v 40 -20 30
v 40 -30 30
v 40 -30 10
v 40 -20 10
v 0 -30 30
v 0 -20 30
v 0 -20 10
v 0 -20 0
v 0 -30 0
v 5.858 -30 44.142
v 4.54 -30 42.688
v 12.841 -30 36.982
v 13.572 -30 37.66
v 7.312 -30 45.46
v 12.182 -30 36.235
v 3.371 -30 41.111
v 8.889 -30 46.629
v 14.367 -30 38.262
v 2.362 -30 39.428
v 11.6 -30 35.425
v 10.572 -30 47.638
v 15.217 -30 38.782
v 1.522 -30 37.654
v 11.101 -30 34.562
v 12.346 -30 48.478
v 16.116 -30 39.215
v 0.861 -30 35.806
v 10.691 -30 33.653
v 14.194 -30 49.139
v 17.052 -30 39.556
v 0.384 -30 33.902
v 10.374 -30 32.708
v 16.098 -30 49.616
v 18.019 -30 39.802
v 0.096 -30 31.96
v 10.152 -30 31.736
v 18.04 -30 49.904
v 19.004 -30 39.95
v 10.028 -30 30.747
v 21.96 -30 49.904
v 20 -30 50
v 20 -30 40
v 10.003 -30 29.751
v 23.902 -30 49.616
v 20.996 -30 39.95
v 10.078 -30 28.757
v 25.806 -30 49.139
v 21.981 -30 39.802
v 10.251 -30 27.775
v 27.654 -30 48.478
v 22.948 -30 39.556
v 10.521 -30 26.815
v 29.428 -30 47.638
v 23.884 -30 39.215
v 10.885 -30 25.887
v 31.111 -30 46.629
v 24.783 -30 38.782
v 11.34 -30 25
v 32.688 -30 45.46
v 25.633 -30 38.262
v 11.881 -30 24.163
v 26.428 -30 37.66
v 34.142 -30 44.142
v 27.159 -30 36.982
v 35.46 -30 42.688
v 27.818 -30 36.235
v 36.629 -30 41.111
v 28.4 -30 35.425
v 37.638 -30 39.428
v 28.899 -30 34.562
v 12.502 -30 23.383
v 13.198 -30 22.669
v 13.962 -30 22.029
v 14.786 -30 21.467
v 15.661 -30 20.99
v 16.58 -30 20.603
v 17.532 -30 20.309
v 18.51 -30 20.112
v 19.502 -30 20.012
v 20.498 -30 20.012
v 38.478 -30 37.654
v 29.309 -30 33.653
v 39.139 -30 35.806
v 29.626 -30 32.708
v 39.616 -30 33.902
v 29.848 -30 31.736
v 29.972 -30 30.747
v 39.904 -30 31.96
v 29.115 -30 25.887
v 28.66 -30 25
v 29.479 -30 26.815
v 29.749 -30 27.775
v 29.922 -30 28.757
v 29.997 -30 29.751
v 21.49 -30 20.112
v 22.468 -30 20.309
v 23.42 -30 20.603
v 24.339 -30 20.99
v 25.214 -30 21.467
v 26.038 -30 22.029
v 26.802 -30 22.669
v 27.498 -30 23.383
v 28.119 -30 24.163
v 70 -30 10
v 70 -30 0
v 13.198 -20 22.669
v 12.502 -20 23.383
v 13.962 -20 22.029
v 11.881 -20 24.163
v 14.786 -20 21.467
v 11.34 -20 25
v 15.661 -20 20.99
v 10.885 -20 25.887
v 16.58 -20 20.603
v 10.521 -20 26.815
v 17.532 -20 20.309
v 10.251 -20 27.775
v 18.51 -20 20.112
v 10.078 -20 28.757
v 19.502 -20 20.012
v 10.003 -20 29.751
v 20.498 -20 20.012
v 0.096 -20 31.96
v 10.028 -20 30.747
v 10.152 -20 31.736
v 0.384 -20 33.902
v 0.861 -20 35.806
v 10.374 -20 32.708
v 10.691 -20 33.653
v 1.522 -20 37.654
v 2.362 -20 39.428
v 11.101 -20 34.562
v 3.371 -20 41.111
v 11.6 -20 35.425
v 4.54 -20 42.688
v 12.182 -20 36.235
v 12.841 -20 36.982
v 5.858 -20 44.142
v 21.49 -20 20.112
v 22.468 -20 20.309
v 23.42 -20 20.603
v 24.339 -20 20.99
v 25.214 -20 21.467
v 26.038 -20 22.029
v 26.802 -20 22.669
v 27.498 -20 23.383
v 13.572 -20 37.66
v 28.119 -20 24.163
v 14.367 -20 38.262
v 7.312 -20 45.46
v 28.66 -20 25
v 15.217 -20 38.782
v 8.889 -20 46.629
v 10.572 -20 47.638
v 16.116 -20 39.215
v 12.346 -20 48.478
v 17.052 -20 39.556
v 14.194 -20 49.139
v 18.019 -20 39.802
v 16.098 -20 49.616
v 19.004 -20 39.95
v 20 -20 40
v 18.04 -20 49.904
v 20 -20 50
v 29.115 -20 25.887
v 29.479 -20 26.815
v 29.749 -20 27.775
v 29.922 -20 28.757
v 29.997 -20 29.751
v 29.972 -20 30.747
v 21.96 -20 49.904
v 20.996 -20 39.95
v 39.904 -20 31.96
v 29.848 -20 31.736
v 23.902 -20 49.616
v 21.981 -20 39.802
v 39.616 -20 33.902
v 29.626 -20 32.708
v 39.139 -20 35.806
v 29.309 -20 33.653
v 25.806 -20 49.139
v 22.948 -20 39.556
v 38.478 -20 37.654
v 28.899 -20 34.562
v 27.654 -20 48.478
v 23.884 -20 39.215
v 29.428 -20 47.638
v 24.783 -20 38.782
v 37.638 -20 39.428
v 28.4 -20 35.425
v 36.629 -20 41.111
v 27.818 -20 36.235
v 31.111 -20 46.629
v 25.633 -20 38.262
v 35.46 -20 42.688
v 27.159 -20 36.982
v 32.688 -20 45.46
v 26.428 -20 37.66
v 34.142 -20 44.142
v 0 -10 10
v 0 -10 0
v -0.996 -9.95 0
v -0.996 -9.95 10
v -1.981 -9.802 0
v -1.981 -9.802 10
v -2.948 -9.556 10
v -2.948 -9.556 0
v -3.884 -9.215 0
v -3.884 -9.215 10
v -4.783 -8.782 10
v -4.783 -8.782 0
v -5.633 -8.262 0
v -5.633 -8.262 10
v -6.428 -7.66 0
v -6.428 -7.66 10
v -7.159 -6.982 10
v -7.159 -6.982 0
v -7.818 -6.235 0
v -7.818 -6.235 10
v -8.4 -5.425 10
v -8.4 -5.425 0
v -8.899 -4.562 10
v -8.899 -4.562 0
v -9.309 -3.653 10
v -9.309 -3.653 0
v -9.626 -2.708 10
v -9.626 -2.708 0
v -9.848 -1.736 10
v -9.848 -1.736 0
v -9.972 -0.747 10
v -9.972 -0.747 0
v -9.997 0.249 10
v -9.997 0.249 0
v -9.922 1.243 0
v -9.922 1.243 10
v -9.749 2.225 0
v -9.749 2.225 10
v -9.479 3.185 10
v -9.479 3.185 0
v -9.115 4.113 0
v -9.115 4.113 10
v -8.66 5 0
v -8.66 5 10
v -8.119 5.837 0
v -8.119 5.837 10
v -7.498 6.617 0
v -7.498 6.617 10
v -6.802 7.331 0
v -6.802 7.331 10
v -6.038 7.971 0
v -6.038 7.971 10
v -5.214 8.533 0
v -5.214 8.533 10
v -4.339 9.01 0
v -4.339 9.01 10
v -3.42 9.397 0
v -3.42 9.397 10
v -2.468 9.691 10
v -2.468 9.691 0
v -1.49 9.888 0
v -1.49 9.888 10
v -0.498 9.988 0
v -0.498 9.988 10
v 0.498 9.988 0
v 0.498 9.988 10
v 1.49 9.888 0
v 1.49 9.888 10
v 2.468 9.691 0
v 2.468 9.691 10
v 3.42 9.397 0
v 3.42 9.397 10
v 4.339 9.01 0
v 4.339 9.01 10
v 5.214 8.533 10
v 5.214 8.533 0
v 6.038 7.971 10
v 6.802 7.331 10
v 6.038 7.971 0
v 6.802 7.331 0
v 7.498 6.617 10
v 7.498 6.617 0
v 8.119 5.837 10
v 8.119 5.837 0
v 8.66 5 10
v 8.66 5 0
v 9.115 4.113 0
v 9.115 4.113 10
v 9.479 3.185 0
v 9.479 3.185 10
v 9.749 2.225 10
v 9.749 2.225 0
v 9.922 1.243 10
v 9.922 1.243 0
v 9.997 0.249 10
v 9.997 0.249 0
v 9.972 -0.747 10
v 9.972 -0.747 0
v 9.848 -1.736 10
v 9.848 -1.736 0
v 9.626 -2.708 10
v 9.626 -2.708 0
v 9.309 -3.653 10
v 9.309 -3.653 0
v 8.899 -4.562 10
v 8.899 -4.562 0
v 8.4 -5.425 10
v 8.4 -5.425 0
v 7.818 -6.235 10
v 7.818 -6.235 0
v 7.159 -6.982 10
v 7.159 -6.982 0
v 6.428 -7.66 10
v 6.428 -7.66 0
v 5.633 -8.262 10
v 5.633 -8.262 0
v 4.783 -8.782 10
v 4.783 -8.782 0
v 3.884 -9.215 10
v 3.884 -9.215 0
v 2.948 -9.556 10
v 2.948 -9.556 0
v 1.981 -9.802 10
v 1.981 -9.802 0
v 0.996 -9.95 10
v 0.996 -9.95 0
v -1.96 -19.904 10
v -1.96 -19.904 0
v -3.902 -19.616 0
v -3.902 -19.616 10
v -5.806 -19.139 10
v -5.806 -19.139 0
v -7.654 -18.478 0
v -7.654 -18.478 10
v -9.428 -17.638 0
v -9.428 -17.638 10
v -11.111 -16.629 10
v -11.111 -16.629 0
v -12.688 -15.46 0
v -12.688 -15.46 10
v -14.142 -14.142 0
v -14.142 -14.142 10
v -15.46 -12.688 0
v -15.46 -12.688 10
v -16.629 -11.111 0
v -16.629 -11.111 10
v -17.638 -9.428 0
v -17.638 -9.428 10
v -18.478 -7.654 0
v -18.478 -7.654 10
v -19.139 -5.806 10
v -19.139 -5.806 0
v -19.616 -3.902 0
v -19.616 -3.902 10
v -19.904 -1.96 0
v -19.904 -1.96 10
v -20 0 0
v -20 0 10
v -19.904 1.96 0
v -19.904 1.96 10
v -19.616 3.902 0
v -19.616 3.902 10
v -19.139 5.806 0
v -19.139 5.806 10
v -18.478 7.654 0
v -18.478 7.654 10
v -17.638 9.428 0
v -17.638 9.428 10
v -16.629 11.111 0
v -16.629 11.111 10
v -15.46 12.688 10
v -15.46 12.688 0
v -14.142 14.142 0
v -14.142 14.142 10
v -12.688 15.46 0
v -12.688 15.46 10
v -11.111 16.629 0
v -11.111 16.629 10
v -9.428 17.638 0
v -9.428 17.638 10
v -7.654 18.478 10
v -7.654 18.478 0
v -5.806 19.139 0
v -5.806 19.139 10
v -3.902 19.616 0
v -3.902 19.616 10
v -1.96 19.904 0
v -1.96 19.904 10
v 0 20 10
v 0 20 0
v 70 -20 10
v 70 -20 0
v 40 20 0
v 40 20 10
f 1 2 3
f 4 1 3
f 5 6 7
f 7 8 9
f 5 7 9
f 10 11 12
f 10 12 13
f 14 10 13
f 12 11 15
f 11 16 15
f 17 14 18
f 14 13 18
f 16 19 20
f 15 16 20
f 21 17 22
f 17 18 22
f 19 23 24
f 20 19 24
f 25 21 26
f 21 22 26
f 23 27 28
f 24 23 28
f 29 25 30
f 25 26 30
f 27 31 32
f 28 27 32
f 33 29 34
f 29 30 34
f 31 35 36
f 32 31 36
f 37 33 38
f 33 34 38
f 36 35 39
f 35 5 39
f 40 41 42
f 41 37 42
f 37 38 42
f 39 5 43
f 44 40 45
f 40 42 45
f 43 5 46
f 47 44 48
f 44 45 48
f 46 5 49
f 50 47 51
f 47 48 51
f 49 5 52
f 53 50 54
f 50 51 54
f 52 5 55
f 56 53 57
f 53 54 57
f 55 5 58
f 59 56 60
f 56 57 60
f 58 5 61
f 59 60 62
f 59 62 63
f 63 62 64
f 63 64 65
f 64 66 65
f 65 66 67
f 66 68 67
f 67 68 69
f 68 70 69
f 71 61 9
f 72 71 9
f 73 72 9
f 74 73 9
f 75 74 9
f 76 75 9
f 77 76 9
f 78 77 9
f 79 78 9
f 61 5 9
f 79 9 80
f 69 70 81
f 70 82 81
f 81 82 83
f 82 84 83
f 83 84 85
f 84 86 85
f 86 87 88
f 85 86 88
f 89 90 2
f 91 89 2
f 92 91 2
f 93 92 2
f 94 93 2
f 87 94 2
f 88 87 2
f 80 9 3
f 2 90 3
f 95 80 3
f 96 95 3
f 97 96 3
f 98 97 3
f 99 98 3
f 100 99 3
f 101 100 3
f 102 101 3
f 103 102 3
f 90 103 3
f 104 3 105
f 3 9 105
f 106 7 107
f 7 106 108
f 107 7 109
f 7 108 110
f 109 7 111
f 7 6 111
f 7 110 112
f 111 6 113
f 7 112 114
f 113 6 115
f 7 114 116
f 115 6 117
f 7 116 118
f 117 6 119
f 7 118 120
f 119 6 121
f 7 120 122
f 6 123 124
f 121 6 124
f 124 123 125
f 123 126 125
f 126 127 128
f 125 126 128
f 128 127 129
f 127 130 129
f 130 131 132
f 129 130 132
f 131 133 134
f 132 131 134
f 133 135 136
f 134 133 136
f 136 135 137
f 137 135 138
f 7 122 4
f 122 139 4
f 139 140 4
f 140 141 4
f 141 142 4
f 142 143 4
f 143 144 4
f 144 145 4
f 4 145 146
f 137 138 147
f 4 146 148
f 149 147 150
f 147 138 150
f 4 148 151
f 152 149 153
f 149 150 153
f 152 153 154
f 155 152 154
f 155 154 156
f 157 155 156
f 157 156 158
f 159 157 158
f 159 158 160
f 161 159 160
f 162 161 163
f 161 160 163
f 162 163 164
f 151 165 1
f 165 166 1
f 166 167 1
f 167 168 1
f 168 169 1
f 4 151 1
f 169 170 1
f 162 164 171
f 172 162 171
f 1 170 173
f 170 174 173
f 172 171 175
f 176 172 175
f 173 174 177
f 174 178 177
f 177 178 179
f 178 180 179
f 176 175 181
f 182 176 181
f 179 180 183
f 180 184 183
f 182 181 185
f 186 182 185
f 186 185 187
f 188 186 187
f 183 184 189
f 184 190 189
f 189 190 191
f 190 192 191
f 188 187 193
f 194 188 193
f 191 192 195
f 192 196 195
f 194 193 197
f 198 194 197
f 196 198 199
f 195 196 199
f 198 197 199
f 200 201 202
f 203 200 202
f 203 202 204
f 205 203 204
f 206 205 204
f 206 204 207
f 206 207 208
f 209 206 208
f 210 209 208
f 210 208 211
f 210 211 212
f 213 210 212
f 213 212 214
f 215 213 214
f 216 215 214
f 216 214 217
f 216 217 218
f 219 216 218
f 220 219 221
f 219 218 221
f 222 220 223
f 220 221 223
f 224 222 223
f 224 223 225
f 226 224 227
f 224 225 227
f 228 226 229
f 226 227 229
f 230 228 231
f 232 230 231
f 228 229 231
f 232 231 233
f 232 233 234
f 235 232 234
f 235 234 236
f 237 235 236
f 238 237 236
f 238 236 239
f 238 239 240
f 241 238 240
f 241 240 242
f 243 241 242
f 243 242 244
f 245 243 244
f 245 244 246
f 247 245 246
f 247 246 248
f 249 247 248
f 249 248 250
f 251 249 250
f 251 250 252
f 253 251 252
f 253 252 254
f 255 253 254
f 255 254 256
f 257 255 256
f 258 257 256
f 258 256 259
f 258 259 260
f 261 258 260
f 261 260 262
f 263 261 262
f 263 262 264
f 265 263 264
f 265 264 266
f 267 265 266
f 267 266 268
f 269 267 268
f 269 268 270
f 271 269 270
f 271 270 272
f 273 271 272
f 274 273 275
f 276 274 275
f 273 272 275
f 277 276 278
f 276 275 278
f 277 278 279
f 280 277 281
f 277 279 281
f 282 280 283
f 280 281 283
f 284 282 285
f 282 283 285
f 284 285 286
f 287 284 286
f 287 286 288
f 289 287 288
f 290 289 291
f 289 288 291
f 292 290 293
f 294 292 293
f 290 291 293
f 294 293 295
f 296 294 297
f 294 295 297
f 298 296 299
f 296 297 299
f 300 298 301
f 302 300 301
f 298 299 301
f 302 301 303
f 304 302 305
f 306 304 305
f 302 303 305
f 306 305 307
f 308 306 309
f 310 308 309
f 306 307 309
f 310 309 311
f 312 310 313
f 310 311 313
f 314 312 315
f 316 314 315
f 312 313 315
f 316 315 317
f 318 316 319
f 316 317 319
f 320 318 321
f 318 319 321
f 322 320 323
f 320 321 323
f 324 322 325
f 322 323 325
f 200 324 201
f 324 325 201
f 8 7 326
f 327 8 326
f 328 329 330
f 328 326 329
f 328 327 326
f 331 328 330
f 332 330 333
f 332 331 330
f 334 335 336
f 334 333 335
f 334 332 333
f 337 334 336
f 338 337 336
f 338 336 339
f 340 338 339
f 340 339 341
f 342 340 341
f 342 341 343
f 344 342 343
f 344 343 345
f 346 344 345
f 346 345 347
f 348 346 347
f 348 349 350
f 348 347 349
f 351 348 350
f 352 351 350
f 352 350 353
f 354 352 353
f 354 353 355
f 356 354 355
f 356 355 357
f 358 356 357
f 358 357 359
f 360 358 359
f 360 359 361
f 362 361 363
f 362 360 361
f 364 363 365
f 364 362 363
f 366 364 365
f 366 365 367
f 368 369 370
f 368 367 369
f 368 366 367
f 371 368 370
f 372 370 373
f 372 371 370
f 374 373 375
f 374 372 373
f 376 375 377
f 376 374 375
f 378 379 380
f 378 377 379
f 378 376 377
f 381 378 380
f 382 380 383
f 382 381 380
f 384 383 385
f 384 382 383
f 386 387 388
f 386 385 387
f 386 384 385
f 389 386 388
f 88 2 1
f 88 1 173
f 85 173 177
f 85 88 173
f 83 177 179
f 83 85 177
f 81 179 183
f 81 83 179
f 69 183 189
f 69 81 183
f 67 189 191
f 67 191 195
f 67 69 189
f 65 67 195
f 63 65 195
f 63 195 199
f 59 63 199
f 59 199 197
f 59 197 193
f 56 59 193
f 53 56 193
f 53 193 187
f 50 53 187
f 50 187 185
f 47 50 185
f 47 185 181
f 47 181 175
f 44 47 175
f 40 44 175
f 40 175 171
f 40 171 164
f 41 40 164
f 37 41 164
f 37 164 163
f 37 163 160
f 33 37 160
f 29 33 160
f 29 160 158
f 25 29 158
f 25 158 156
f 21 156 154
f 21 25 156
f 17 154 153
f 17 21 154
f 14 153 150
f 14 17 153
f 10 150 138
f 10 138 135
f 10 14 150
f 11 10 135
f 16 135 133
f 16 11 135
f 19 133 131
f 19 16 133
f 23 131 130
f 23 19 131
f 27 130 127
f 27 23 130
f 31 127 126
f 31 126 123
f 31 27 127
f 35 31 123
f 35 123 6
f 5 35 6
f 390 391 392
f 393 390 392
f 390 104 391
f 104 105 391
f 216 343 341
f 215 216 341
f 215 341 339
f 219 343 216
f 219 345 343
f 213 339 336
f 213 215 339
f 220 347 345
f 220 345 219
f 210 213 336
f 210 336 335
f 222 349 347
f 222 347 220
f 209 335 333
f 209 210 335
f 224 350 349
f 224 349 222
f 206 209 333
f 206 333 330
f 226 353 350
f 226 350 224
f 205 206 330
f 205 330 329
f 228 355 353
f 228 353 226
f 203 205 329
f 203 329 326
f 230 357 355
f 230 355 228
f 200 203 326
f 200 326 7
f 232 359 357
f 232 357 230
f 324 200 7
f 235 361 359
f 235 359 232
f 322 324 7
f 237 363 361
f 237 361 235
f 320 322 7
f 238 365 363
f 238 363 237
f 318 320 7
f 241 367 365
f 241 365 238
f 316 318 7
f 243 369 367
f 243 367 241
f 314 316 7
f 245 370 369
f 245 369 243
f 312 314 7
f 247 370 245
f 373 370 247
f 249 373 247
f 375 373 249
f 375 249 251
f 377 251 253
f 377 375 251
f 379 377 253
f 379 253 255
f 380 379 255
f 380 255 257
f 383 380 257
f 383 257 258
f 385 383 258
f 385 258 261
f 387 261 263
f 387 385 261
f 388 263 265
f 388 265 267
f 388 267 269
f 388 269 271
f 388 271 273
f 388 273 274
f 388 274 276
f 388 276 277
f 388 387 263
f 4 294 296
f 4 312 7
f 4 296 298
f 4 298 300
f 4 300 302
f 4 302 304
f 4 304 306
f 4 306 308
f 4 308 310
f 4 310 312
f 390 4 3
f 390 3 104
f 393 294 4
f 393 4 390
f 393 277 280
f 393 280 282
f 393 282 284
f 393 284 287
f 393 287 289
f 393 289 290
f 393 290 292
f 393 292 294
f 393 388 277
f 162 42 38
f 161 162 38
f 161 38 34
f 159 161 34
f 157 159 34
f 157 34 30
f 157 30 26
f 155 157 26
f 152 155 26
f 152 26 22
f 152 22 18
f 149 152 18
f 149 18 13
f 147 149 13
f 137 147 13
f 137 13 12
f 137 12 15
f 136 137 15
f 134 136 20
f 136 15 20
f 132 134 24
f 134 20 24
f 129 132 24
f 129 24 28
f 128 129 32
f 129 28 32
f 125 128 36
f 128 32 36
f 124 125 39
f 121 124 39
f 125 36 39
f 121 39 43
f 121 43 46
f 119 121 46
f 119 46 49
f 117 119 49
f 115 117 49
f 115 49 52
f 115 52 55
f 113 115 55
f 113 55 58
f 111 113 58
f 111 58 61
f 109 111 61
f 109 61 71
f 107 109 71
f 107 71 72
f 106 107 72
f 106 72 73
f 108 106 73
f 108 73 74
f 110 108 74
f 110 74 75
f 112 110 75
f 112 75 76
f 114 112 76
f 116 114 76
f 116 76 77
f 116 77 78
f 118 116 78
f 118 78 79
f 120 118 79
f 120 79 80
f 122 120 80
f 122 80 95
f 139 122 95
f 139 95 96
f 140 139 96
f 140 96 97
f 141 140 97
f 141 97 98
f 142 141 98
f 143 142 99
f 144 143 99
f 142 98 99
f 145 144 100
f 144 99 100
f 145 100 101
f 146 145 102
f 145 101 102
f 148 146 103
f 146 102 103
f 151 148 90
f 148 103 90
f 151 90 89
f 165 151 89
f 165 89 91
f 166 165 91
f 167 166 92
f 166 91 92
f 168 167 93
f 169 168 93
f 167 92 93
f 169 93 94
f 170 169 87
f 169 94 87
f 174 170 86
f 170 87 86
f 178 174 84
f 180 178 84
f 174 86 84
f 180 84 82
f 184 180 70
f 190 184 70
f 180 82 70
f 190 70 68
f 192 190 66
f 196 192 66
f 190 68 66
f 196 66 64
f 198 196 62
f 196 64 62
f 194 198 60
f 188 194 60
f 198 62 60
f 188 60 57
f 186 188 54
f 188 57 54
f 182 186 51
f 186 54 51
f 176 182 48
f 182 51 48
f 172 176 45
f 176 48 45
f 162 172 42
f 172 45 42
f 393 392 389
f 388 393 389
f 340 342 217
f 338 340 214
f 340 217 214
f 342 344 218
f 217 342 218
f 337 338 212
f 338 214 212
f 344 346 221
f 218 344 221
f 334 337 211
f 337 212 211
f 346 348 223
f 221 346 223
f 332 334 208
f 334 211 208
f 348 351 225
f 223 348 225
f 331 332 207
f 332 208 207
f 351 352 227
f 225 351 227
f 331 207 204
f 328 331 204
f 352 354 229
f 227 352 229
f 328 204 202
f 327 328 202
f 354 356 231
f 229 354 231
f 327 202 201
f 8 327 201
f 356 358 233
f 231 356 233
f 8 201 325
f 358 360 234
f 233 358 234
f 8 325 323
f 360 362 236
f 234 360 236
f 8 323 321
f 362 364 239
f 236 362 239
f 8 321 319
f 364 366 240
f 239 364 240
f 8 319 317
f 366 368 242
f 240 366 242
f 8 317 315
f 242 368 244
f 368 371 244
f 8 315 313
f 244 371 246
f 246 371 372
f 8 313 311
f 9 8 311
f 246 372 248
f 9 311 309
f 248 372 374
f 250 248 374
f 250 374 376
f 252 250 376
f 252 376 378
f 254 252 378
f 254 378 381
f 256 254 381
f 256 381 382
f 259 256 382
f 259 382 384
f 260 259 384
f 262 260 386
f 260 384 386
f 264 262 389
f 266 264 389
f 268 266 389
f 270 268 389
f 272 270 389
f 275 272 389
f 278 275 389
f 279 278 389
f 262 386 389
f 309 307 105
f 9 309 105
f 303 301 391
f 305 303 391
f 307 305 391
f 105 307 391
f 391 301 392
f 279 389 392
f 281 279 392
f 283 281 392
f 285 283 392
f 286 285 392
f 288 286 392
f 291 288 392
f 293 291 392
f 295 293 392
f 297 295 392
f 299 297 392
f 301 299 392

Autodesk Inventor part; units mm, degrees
ref_plane "YZ Plane" through (0, 0, 0) normal (1, 0, 0) x (0, 1, 0)
ref_plane "XZ Plane" through (0, 0, 0) normal (0, 1, 0) x (-1, 0, 0)
ref_plane "XY Plane" through (0, 0, 0) normal (0, 0, 1) x (1, 0, 0)
sketch "草圖1" plane through (0, 0, 0) normal (0, 0, 1) x (1, 0, 0)
  circle A0 centre (0, 0) radius 20
  line L0 (0, -20) -> (0, -30)
  line L1 (0, -30) -> (70, -30)
  line L2 (70, -30) -> (70, -20)
  line L3 (70, -20) -> (40, 20)
  line L4 (40, 20) -> (0, 20)
  dimension "d0" = 40
  dimension "d1" = 10
  dimension "d2" = 70
  dimension "d3" = 40
  dimension "d4" = 10
extrude "擠出1" add sketch "草圖1" along normal blind 10
sketch "草圖2" plane through (0, 0, 10) normal (0, 0, 1) x (1, 0, 0)
  arc A0 (0, 20) -> (0, -20) centre (0, 0) ccw projected
hole "孔1" at (0, 0, 10) direction (0, 0, -1) diameter 20 end through all
sketch "草圖3" plane through (0, -30, 0) normal (0, -1, 0) x (1, 0, 0)
  line L0 (70, 10) -> (70, 0) projected
  line L1 (70, 0) -> (0, 0) projected
  line L2 (0, 0) -> (0, 10) projected
  line L3 (0, 10) -> (70, 10) projected
  circle A0 centre (20, 30) radius 20
  line L4 (0, 30) -> (40, 30)
  line L5 (40, 30) -> (40, 0)
  line L6 (40, 0) -> (0, 0)
  line L7 (0, 0) -> (0, 30)
  line L8 (0, 0) -> (70, 0) projected
  line L9 (0, 0) -> (0, 10) projected
  point P0 (40, 10)
  point P1 (40, 30)
  dimension "d14" = 40
  dimension "d15" = 30
extrude "擠出2" add sketch "草圖3" against normal blind 10 contours L3 A0 L5 | L3 L7 A0 | A0 L4 | L4 A0
sketch "草圖4" plane through (0, -20, 0) normal (0, 1, 0) x (1, 0, 0)
  arc A0 (0, -30) -> (40, -30) centre (20, -30) ccw projected
  point P0 (0, 0)
hole "孔2" at (20, -20, 30) direction (0, -1, 0) diameter 20 end through all
properties part number "25" material "鋼、碳鋼"
